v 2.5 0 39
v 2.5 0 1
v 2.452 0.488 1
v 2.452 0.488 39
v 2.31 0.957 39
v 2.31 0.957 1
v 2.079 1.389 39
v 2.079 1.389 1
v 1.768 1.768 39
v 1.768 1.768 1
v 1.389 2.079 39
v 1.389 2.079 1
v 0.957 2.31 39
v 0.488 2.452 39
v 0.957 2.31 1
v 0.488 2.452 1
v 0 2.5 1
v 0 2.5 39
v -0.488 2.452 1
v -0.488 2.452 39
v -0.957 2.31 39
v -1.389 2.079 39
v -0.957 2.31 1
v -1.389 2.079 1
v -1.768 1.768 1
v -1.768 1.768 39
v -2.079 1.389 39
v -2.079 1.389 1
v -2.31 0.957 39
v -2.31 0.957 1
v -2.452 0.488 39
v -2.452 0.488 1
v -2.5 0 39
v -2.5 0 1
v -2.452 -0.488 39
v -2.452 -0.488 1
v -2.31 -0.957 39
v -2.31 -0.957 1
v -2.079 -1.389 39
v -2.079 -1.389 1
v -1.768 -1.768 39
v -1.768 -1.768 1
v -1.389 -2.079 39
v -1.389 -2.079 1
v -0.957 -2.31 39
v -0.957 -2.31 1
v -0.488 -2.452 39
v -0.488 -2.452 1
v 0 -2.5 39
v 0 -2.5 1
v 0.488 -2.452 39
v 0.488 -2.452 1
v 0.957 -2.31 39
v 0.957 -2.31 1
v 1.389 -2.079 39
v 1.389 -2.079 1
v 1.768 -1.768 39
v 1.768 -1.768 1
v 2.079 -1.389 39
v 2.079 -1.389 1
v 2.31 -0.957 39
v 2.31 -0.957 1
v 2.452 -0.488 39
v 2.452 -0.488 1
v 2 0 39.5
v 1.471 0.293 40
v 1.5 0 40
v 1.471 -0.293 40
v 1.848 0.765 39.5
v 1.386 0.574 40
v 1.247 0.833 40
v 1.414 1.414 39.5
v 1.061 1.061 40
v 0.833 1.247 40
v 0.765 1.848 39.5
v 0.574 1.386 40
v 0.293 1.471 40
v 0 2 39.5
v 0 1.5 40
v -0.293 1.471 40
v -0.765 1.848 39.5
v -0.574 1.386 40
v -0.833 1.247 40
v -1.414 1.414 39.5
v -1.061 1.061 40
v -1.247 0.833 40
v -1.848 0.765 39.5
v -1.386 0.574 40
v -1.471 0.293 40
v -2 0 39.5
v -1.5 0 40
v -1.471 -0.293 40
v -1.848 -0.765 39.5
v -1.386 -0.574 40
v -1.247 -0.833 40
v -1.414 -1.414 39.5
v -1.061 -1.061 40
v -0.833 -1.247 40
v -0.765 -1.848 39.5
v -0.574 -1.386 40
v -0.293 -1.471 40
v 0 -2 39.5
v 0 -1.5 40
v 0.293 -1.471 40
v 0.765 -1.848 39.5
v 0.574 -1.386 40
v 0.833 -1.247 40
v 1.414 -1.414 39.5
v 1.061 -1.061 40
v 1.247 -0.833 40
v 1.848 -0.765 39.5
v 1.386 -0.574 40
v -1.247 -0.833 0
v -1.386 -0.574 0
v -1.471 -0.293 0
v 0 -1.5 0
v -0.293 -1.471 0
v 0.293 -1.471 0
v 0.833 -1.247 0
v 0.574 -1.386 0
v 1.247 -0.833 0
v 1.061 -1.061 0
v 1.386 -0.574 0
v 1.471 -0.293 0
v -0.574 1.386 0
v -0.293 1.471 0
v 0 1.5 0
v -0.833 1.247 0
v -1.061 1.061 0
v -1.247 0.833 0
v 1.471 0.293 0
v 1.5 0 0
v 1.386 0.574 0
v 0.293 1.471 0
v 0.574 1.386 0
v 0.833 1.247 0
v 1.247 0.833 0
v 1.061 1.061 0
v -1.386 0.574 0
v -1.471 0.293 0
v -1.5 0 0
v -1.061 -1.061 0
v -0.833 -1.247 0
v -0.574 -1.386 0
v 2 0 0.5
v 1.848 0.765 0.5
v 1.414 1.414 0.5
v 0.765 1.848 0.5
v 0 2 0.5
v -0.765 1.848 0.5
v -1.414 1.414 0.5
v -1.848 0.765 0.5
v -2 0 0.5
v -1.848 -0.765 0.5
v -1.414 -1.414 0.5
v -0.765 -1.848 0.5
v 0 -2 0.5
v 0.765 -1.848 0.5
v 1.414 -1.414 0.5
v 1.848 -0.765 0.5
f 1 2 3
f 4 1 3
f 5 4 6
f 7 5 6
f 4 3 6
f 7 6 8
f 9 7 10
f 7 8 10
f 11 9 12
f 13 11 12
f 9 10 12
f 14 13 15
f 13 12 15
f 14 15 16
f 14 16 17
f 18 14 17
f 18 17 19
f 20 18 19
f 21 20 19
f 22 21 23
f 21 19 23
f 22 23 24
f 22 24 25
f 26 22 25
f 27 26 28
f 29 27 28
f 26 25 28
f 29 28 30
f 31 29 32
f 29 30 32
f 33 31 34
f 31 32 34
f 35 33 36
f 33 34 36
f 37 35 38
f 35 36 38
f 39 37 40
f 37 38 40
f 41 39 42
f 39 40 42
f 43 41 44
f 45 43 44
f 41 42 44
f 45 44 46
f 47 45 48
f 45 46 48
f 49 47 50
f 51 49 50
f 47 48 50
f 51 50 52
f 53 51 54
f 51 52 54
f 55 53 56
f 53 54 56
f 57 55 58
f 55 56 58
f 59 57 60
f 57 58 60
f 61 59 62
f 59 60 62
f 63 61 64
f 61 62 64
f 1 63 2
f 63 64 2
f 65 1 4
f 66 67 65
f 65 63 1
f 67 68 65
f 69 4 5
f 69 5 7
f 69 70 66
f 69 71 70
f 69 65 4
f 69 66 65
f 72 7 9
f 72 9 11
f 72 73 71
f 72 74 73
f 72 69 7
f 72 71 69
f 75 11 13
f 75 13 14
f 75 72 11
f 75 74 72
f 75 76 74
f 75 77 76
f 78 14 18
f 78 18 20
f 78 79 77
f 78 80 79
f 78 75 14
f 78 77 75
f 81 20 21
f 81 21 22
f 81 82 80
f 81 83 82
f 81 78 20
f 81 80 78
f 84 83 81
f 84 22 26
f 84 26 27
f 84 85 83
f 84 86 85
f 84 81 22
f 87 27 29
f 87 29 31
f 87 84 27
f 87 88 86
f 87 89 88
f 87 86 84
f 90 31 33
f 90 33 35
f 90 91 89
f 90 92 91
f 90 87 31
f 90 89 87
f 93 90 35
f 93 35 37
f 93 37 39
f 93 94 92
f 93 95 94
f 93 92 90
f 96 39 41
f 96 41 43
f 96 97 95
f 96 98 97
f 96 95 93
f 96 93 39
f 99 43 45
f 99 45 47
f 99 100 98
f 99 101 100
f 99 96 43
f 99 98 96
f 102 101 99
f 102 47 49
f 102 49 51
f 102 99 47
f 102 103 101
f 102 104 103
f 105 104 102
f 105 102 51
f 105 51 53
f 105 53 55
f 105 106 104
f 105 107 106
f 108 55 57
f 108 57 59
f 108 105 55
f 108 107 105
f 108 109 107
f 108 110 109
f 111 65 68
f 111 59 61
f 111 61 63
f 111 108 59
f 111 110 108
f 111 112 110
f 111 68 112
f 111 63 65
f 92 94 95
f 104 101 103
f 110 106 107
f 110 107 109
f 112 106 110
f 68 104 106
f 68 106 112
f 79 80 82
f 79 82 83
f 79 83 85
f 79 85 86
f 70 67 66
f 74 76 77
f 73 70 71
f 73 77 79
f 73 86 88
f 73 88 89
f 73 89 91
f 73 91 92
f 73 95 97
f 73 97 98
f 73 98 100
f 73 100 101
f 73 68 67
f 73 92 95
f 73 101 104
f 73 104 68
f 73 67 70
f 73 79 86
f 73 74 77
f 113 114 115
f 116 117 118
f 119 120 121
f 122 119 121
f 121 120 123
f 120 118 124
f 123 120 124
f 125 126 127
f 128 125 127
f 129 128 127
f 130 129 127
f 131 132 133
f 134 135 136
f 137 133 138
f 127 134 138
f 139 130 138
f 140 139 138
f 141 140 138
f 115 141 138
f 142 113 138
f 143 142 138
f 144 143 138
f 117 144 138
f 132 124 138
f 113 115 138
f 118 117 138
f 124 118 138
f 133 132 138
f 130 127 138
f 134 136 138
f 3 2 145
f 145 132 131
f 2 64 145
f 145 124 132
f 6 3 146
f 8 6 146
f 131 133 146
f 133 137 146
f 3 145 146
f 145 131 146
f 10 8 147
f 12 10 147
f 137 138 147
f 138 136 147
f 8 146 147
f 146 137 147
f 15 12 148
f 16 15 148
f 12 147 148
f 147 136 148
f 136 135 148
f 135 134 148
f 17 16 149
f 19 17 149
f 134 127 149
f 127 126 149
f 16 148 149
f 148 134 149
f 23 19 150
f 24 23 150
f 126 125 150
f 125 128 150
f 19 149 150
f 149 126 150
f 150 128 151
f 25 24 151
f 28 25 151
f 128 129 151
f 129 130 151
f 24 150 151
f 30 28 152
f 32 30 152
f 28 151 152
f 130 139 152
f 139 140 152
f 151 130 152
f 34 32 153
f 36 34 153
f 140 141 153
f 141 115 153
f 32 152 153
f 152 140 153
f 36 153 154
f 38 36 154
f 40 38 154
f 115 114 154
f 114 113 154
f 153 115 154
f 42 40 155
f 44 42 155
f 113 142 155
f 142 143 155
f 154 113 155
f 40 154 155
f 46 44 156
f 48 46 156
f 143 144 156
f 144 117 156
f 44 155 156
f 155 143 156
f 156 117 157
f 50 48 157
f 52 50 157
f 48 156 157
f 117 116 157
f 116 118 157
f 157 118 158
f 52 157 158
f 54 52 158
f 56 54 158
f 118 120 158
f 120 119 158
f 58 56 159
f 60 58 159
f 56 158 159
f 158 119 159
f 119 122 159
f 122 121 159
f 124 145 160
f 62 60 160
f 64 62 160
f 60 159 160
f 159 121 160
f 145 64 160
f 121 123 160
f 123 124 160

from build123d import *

# Parameters (mm, degrees)
SKETCH_1_R      = 2.5
EXTRUDE_1_DEPTH = 40
CHAMFER_1_SIZE  = 1
CHAMFER_2_SIZE  = 1


with BuildPart() as part:
    # Эскиз1 → Бобышка-Вытянуть1 (new body)
    with BuildSketch(Plane.XY):
        Circle(SKETCH_1_R)
    extrude(amount=EXTRUDE_1_DEPTH)

    # Фаска1
    chamfer_1_edges = [part.edges().sort_by_distance(p)[0] for p in [
        (-2.5, 0, 40),
    ]]
    chamfer(chamfer_1_edges, length=CHAMFER_1_SIZE)

    # Фаска2
    chamfer_2_edges = [part.edges().sort_by_distance(p)[0] for p in [
        (-2.5, 0, 0),
    ]]
    chamfer(chamfer_2_edges, length=CHAMFER_2_SIZE)


solid = part.part
